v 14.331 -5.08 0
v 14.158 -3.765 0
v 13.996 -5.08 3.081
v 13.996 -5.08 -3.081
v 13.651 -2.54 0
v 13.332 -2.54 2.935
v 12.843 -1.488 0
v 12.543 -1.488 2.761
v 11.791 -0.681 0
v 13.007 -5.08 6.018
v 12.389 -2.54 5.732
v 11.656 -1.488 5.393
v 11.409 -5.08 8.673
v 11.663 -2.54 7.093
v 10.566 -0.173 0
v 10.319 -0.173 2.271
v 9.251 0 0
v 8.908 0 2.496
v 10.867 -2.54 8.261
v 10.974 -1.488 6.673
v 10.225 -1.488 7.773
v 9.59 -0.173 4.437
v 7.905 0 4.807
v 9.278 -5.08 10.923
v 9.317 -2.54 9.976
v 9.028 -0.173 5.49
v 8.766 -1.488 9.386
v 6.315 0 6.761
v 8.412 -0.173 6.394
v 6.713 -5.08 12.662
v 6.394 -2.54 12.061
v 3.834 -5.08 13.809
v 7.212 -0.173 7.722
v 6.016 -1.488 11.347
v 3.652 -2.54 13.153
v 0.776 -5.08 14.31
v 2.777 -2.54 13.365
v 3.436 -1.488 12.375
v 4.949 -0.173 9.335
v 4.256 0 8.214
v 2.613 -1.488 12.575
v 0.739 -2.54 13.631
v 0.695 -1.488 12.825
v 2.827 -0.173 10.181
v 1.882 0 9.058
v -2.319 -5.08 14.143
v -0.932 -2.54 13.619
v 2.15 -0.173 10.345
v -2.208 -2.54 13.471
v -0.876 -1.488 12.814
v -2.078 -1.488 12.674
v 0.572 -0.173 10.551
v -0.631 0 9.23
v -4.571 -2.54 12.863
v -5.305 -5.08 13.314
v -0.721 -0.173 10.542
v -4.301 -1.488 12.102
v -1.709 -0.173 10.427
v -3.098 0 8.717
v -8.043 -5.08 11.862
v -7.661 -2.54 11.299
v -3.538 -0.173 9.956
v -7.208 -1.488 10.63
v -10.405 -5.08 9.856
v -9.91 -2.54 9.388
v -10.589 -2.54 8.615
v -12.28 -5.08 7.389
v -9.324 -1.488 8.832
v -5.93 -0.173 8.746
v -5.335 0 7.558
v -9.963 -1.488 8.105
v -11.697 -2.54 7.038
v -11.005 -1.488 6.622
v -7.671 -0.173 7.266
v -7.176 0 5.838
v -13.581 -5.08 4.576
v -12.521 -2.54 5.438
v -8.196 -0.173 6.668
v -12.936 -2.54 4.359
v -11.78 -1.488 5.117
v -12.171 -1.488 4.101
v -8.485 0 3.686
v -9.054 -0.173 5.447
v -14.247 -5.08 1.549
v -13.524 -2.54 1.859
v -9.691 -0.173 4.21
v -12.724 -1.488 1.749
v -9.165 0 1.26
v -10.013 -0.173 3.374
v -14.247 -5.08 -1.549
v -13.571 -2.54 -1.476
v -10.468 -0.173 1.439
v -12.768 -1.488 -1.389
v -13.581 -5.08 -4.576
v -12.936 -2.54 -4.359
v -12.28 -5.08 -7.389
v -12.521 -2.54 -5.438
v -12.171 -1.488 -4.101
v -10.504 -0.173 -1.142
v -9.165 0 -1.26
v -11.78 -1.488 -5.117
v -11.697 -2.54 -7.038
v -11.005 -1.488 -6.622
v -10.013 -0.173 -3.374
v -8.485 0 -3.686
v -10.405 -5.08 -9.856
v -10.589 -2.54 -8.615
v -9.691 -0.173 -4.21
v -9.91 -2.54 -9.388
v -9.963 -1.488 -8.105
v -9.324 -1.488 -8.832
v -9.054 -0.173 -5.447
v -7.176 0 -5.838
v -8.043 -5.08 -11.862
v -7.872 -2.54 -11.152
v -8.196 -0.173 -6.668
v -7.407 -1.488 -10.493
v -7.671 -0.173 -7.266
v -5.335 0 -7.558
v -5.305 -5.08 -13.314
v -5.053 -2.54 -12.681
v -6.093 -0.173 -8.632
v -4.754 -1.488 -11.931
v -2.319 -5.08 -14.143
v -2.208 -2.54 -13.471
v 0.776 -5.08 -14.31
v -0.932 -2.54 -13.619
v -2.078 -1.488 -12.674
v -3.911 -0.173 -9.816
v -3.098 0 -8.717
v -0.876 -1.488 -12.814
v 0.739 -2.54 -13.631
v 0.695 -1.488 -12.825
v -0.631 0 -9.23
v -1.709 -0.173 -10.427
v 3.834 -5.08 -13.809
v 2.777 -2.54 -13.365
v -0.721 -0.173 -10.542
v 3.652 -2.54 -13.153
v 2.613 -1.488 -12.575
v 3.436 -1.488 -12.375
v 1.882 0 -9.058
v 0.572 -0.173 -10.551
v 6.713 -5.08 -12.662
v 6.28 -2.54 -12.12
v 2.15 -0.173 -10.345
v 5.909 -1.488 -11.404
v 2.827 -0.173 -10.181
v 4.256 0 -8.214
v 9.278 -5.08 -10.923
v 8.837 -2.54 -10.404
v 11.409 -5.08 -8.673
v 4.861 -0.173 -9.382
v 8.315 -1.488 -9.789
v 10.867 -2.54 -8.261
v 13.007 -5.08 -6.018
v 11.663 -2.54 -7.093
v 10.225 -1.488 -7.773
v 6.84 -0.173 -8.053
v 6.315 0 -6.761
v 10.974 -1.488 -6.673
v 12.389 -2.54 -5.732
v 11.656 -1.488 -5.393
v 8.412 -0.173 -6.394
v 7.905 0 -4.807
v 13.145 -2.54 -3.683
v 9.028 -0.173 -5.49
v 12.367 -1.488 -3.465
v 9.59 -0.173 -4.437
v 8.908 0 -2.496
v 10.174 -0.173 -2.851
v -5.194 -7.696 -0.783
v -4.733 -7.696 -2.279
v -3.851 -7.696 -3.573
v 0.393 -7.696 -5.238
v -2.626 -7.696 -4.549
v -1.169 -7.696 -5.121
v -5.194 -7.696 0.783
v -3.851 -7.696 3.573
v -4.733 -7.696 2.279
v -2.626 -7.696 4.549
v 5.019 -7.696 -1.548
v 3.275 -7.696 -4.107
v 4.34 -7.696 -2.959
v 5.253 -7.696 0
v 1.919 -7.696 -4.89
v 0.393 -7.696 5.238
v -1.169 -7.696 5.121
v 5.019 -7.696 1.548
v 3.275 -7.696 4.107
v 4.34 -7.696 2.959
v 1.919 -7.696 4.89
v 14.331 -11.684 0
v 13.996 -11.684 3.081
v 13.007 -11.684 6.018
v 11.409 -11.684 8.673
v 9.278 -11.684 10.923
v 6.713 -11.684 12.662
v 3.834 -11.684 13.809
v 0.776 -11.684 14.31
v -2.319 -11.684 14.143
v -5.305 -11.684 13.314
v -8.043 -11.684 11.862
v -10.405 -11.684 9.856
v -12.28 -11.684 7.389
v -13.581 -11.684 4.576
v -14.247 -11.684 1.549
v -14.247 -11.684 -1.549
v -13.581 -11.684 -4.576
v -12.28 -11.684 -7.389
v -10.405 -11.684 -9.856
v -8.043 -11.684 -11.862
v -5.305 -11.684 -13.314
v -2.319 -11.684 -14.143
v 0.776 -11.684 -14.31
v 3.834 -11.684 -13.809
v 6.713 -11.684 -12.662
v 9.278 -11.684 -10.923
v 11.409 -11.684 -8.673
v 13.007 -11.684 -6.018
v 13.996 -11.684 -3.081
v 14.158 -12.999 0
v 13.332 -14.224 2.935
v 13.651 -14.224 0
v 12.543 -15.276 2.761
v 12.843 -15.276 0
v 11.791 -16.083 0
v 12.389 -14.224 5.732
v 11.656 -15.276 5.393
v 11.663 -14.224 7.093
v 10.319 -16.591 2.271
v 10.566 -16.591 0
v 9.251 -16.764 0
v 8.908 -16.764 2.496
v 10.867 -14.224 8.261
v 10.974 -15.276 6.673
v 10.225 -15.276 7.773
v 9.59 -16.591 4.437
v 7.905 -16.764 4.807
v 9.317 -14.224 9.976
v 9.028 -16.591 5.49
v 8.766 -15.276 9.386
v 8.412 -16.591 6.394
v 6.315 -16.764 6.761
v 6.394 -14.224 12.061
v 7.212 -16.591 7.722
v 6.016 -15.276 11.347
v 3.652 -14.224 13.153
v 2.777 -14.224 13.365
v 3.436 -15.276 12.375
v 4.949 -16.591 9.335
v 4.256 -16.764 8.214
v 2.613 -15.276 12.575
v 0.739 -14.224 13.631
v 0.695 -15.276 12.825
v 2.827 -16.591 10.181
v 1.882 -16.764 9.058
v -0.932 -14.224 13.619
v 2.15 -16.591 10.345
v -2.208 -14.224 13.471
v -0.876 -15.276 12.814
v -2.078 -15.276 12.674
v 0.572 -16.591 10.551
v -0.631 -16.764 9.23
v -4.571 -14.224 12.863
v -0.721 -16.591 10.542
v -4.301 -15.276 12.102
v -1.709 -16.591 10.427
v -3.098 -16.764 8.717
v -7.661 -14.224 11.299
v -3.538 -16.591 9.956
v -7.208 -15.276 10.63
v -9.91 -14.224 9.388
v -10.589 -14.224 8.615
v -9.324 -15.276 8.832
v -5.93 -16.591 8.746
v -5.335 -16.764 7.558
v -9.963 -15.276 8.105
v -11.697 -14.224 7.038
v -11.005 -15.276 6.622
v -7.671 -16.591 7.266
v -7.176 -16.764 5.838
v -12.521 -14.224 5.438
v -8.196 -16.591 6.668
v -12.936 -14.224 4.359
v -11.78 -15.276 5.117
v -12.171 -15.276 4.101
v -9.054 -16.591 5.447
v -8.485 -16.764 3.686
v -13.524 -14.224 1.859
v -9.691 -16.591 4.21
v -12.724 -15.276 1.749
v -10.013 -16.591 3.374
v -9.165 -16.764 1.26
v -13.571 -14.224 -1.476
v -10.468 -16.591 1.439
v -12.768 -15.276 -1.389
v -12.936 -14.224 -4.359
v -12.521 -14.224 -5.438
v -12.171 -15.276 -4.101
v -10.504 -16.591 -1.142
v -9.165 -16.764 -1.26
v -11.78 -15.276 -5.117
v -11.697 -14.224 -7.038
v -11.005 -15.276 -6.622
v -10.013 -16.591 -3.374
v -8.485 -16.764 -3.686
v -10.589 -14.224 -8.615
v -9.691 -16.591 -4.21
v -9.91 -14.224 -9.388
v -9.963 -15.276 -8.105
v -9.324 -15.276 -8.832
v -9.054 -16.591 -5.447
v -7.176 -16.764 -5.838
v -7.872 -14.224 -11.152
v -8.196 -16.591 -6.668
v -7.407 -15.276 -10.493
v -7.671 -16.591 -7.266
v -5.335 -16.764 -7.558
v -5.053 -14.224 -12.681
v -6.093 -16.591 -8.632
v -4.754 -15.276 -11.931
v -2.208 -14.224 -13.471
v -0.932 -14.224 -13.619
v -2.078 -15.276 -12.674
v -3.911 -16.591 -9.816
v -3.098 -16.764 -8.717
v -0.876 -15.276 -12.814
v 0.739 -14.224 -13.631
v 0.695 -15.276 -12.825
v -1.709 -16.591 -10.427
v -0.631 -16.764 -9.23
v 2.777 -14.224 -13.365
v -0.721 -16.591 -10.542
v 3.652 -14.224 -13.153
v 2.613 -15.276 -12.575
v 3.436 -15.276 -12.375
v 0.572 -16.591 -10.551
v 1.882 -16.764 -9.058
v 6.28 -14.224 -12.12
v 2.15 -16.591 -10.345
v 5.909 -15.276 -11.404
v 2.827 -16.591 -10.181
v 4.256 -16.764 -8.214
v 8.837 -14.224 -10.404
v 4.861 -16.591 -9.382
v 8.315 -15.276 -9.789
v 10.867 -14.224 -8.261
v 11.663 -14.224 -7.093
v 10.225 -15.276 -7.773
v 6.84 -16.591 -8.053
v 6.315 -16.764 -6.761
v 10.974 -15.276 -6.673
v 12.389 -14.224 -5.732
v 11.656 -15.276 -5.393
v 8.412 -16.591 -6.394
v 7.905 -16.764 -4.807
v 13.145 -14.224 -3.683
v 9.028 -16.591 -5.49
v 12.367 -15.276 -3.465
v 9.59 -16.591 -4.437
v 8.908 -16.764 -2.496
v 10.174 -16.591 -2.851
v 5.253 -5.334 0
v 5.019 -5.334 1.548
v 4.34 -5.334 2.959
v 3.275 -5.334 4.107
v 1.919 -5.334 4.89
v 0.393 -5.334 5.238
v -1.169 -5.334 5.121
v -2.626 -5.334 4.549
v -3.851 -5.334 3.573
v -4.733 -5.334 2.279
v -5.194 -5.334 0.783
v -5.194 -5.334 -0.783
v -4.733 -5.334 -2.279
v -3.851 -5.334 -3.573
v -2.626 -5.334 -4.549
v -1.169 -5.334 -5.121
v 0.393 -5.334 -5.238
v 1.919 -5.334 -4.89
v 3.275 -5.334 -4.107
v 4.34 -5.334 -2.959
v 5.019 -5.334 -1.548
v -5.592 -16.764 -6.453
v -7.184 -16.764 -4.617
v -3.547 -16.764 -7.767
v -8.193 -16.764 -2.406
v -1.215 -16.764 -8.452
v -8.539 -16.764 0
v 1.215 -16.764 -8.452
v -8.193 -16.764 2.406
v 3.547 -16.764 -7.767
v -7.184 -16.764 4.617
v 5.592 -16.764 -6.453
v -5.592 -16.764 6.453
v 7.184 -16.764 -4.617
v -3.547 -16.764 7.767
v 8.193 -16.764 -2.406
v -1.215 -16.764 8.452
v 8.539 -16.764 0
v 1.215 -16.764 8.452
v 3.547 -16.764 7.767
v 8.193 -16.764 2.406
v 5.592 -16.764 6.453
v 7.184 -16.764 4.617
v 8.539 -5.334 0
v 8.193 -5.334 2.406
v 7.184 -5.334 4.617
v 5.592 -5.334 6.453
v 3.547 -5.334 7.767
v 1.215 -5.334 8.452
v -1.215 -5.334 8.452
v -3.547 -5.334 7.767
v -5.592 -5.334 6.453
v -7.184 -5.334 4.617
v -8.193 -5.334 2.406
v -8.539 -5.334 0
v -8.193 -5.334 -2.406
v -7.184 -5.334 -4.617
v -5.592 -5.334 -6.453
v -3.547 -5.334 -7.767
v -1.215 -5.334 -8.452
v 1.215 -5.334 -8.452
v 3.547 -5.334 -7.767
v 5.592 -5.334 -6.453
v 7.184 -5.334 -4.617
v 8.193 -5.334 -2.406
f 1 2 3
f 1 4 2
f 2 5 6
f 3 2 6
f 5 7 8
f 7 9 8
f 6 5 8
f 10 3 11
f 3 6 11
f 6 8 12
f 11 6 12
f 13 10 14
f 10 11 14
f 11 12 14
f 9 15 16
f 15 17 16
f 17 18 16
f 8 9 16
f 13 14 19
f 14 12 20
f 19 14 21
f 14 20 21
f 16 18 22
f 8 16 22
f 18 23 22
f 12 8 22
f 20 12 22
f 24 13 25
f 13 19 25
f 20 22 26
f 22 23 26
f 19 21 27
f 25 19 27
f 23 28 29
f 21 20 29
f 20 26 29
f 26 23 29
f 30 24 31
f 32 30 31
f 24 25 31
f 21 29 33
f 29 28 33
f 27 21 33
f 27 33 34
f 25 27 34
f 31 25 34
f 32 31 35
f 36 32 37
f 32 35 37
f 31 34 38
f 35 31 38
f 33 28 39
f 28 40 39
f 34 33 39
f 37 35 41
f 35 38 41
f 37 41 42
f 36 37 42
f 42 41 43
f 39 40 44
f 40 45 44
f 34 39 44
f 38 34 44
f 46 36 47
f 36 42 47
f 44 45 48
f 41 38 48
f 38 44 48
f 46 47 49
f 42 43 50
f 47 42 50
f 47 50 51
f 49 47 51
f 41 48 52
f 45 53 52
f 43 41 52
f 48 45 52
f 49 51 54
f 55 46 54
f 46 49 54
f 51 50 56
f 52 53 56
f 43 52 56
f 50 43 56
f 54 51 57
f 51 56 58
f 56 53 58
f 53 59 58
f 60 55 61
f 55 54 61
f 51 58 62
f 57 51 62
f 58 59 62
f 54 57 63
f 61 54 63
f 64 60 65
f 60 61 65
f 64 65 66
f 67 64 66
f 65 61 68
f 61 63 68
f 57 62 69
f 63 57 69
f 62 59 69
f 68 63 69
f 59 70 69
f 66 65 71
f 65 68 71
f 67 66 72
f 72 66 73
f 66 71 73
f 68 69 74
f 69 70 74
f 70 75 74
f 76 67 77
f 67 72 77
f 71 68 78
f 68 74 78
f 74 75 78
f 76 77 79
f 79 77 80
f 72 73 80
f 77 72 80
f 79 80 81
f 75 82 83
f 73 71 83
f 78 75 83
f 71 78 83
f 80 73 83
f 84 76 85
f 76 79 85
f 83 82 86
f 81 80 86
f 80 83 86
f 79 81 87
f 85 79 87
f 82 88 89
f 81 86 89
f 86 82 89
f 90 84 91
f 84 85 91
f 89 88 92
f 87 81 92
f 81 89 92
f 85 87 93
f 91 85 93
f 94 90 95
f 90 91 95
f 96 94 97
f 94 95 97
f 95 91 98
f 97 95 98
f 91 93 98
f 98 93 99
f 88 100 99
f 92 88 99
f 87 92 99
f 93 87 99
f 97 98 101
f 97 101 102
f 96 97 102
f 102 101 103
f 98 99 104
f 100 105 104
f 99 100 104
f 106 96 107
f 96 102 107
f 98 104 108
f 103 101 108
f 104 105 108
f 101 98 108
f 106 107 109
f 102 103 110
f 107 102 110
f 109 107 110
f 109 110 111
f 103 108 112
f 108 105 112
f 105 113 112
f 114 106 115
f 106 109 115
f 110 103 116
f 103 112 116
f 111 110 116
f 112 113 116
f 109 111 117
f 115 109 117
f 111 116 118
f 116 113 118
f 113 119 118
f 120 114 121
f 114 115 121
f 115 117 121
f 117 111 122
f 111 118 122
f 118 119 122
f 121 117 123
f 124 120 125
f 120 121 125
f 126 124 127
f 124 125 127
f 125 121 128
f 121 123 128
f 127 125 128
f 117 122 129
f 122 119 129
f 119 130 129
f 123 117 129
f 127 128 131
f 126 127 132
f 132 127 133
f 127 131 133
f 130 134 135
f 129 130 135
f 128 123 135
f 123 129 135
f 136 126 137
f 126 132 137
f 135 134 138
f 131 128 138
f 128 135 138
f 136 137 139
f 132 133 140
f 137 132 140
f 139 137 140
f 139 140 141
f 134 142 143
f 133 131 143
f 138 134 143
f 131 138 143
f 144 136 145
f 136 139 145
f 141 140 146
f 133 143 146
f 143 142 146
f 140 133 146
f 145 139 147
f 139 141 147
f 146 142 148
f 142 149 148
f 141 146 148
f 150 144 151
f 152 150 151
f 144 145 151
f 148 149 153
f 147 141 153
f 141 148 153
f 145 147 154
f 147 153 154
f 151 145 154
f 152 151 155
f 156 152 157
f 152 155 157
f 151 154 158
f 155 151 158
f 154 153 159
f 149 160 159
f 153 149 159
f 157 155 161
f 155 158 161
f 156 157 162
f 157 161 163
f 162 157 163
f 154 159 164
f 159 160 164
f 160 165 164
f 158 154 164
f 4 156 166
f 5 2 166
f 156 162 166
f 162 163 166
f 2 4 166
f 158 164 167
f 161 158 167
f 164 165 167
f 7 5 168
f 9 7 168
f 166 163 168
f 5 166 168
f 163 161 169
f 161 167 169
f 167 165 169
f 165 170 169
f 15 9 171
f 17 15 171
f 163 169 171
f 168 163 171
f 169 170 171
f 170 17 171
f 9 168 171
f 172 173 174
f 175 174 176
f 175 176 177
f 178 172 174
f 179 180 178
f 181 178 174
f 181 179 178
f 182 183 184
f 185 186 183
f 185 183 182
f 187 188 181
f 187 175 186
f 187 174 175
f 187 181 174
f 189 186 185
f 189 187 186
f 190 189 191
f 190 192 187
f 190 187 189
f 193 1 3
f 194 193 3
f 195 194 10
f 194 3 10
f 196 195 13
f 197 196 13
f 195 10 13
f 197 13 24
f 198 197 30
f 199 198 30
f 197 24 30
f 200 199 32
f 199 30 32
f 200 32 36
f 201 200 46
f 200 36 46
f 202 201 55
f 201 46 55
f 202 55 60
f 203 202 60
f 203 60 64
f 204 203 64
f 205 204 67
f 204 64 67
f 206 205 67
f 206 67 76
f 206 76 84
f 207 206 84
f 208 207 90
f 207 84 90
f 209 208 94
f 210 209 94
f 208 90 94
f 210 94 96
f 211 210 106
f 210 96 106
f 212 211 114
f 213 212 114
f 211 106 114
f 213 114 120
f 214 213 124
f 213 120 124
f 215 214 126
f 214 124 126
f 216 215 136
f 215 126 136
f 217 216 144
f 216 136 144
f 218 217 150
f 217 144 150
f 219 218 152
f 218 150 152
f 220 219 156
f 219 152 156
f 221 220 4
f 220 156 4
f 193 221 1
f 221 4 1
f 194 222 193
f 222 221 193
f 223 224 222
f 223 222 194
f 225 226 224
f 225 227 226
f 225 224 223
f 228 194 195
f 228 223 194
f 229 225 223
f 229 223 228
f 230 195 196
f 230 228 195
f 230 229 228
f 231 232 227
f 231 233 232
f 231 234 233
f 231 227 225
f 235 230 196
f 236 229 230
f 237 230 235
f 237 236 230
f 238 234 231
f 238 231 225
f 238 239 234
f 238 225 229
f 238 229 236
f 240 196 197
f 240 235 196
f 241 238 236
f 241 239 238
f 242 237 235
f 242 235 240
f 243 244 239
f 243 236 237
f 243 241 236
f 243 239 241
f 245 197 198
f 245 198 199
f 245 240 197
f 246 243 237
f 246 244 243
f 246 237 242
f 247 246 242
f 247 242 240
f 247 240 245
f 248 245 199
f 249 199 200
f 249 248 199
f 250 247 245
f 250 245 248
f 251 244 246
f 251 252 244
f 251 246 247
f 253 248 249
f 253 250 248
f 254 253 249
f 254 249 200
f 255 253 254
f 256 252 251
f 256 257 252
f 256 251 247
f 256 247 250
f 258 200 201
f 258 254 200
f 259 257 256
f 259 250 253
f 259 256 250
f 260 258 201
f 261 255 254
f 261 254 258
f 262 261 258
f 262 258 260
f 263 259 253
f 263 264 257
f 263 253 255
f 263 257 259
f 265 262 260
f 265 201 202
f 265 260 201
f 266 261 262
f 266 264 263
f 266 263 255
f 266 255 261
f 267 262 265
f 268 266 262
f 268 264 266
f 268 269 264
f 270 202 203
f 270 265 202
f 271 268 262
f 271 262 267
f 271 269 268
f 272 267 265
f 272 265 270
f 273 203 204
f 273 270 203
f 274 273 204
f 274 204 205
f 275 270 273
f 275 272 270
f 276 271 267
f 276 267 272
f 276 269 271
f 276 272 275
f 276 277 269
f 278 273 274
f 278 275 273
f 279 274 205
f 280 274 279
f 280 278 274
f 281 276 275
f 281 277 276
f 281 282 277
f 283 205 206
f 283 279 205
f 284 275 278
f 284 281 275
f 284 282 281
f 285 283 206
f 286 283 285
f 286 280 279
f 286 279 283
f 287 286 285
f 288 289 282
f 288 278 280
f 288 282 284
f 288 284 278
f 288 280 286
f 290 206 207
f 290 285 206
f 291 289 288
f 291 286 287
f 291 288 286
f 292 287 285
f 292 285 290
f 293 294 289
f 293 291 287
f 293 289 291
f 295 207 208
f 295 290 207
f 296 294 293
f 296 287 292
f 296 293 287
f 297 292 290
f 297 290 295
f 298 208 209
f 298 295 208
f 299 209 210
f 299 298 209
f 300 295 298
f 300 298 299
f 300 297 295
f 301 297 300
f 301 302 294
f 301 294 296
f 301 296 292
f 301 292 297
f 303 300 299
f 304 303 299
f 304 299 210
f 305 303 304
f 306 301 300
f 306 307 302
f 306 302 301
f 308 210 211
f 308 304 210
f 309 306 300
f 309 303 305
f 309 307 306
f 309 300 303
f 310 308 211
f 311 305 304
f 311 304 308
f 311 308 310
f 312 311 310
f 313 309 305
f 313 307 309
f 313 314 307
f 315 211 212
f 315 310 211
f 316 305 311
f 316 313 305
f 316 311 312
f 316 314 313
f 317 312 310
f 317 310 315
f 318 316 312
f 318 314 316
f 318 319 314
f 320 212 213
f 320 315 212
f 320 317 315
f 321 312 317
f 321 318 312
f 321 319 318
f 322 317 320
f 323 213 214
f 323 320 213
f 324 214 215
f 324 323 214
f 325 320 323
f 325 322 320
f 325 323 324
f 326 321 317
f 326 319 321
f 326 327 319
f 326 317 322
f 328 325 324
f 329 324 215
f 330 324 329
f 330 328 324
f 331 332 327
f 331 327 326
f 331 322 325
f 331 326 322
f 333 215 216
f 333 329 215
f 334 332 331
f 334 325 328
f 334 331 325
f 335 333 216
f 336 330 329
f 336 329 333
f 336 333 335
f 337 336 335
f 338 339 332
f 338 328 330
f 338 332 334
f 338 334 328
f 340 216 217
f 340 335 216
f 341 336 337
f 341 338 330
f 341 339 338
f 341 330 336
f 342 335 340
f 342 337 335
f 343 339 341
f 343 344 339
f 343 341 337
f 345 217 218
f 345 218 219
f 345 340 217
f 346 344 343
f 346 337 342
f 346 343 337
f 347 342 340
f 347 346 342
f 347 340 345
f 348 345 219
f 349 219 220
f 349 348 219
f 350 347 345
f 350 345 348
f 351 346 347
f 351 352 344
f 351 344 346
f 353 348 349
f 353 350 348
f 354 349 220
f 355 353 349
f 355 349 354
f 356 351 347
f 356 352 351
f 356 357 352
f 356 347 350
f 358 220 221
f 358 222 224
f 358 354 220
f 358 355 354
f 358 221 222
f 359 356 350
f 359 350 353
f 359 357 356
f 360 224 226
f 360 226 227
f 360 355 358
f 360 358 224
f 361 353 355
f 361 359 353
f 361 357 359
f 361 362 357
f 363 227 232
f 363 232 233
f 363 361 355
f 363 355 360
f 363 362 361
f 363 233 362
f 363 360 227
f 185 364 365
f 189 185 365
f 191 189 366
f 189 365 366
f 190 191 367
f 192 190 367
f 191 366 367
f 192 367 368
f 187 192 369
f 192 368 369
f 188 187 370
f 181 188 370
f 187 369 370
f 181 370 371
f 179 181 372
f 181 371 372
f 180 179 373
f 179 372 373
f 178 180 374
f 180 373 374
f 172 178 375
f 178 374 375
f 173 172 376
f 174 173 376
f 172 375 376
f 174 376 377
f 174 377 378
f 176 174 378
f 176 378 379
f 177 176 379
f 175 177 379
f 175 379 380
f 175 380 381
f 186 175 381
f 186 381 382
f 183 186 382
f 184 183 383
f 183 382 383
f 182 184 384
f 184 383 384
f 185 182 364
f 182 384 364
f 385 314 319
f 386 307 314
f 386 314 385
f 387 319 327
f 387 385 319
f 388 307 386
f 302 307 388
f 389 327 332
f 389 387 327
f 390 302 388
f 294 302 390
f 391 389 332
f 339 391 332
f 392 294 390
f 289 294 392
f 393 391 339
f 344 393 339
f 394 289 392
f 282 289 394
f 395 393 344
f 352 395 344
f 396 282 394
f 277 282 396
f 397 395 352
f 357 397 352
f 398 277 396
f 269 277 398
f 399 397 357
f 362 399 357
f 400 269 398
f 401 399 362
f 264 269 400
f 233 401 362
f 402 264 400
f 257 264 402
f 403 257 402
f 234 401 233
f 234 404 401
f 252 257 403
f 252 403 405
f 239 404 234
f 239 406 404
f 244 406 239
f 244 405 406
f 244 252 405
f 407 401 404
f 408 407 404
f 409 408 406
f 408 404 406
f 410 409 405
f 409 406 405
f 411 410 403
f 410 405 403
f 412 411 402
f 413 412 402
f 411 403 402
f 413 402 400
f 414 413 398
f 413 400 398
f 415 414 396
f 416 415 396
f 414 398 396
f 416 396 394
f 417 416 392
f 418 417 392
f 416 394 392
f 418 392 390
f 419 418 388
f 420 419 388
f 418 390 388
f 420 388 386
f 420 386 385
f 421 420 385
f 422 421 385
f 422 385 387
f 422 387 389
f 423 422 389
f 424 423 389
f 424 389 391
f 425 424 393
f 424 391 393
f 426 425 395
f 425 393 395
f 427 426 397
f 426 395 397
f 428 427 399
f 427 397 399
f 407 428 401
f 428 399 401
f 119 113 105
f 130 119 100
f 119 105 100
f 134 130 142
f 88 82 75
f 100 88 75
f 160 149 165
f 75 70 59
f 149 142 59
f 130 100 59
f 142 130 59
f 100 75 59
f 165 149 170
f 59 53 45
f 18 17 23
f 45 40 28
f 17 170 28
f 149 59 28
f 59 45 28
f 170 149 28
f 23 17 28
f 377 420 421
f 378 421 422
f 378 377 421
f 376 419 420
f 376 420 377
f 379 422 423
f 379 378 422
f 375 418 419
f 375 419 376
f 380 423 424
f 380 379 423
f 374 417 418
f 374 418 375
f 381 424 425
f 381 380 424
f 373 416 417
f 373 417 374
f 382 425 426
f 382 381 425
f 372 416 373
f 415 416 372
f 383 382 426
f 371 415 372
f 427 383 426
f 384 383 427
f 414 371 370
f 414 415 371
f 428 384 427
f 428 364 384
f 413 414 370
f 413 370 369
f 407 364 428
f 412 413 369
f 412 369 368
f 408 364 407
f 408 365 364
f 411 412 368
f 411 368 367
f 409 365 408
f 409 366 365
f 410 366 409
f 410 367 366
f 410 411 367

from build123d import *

# Parameters (mm, degrees)
F0_R     = 14.331374
F1_DEPTH = 16.764
F2_R     = 5.08
F3_R     = 5.08
F4_R     = 8.539137
F5_DEPTH = 11.43
F6_R     = 5.252723
F7_DEPTH = 2.3622


with BuildPart() as f1:
    # F0 (on Front) → F1 (new body)
    with BuildSketch(Plane.XZ):
        Circle(F0_R)
    extrude(amount=F1_DEPTH)

    # F2
    f2_edges = [f1.edges().sort_by_distance(p)[0] for p in [
        (-14.331374, -16.764, 0),
    ]]
    fillet(f2_edges, radius=F2_R)

    # F3
    f3_edges = [f1.edges().sort_by_distance(p)[0] for p in [
        (-14.331374, 0, 0),
    ]]
    fillet(f3_edges, radius=F3_R)

    # F4 (on face) → F5 (cut)
    with BuildSketch(Plane.XZ.offset(16.764)):
        Circle(F4_R)
    extrude(amount=-F5_DEPTH, mode=Mode.SUBTRACT)

    # F6 (on face) → F7 (join)
    with BuildSketch(Plane.XZ.offset(5.334)):
        Circle(F6_R)
    extrude(amount=F7_DEPTH)


solid = f1.part
